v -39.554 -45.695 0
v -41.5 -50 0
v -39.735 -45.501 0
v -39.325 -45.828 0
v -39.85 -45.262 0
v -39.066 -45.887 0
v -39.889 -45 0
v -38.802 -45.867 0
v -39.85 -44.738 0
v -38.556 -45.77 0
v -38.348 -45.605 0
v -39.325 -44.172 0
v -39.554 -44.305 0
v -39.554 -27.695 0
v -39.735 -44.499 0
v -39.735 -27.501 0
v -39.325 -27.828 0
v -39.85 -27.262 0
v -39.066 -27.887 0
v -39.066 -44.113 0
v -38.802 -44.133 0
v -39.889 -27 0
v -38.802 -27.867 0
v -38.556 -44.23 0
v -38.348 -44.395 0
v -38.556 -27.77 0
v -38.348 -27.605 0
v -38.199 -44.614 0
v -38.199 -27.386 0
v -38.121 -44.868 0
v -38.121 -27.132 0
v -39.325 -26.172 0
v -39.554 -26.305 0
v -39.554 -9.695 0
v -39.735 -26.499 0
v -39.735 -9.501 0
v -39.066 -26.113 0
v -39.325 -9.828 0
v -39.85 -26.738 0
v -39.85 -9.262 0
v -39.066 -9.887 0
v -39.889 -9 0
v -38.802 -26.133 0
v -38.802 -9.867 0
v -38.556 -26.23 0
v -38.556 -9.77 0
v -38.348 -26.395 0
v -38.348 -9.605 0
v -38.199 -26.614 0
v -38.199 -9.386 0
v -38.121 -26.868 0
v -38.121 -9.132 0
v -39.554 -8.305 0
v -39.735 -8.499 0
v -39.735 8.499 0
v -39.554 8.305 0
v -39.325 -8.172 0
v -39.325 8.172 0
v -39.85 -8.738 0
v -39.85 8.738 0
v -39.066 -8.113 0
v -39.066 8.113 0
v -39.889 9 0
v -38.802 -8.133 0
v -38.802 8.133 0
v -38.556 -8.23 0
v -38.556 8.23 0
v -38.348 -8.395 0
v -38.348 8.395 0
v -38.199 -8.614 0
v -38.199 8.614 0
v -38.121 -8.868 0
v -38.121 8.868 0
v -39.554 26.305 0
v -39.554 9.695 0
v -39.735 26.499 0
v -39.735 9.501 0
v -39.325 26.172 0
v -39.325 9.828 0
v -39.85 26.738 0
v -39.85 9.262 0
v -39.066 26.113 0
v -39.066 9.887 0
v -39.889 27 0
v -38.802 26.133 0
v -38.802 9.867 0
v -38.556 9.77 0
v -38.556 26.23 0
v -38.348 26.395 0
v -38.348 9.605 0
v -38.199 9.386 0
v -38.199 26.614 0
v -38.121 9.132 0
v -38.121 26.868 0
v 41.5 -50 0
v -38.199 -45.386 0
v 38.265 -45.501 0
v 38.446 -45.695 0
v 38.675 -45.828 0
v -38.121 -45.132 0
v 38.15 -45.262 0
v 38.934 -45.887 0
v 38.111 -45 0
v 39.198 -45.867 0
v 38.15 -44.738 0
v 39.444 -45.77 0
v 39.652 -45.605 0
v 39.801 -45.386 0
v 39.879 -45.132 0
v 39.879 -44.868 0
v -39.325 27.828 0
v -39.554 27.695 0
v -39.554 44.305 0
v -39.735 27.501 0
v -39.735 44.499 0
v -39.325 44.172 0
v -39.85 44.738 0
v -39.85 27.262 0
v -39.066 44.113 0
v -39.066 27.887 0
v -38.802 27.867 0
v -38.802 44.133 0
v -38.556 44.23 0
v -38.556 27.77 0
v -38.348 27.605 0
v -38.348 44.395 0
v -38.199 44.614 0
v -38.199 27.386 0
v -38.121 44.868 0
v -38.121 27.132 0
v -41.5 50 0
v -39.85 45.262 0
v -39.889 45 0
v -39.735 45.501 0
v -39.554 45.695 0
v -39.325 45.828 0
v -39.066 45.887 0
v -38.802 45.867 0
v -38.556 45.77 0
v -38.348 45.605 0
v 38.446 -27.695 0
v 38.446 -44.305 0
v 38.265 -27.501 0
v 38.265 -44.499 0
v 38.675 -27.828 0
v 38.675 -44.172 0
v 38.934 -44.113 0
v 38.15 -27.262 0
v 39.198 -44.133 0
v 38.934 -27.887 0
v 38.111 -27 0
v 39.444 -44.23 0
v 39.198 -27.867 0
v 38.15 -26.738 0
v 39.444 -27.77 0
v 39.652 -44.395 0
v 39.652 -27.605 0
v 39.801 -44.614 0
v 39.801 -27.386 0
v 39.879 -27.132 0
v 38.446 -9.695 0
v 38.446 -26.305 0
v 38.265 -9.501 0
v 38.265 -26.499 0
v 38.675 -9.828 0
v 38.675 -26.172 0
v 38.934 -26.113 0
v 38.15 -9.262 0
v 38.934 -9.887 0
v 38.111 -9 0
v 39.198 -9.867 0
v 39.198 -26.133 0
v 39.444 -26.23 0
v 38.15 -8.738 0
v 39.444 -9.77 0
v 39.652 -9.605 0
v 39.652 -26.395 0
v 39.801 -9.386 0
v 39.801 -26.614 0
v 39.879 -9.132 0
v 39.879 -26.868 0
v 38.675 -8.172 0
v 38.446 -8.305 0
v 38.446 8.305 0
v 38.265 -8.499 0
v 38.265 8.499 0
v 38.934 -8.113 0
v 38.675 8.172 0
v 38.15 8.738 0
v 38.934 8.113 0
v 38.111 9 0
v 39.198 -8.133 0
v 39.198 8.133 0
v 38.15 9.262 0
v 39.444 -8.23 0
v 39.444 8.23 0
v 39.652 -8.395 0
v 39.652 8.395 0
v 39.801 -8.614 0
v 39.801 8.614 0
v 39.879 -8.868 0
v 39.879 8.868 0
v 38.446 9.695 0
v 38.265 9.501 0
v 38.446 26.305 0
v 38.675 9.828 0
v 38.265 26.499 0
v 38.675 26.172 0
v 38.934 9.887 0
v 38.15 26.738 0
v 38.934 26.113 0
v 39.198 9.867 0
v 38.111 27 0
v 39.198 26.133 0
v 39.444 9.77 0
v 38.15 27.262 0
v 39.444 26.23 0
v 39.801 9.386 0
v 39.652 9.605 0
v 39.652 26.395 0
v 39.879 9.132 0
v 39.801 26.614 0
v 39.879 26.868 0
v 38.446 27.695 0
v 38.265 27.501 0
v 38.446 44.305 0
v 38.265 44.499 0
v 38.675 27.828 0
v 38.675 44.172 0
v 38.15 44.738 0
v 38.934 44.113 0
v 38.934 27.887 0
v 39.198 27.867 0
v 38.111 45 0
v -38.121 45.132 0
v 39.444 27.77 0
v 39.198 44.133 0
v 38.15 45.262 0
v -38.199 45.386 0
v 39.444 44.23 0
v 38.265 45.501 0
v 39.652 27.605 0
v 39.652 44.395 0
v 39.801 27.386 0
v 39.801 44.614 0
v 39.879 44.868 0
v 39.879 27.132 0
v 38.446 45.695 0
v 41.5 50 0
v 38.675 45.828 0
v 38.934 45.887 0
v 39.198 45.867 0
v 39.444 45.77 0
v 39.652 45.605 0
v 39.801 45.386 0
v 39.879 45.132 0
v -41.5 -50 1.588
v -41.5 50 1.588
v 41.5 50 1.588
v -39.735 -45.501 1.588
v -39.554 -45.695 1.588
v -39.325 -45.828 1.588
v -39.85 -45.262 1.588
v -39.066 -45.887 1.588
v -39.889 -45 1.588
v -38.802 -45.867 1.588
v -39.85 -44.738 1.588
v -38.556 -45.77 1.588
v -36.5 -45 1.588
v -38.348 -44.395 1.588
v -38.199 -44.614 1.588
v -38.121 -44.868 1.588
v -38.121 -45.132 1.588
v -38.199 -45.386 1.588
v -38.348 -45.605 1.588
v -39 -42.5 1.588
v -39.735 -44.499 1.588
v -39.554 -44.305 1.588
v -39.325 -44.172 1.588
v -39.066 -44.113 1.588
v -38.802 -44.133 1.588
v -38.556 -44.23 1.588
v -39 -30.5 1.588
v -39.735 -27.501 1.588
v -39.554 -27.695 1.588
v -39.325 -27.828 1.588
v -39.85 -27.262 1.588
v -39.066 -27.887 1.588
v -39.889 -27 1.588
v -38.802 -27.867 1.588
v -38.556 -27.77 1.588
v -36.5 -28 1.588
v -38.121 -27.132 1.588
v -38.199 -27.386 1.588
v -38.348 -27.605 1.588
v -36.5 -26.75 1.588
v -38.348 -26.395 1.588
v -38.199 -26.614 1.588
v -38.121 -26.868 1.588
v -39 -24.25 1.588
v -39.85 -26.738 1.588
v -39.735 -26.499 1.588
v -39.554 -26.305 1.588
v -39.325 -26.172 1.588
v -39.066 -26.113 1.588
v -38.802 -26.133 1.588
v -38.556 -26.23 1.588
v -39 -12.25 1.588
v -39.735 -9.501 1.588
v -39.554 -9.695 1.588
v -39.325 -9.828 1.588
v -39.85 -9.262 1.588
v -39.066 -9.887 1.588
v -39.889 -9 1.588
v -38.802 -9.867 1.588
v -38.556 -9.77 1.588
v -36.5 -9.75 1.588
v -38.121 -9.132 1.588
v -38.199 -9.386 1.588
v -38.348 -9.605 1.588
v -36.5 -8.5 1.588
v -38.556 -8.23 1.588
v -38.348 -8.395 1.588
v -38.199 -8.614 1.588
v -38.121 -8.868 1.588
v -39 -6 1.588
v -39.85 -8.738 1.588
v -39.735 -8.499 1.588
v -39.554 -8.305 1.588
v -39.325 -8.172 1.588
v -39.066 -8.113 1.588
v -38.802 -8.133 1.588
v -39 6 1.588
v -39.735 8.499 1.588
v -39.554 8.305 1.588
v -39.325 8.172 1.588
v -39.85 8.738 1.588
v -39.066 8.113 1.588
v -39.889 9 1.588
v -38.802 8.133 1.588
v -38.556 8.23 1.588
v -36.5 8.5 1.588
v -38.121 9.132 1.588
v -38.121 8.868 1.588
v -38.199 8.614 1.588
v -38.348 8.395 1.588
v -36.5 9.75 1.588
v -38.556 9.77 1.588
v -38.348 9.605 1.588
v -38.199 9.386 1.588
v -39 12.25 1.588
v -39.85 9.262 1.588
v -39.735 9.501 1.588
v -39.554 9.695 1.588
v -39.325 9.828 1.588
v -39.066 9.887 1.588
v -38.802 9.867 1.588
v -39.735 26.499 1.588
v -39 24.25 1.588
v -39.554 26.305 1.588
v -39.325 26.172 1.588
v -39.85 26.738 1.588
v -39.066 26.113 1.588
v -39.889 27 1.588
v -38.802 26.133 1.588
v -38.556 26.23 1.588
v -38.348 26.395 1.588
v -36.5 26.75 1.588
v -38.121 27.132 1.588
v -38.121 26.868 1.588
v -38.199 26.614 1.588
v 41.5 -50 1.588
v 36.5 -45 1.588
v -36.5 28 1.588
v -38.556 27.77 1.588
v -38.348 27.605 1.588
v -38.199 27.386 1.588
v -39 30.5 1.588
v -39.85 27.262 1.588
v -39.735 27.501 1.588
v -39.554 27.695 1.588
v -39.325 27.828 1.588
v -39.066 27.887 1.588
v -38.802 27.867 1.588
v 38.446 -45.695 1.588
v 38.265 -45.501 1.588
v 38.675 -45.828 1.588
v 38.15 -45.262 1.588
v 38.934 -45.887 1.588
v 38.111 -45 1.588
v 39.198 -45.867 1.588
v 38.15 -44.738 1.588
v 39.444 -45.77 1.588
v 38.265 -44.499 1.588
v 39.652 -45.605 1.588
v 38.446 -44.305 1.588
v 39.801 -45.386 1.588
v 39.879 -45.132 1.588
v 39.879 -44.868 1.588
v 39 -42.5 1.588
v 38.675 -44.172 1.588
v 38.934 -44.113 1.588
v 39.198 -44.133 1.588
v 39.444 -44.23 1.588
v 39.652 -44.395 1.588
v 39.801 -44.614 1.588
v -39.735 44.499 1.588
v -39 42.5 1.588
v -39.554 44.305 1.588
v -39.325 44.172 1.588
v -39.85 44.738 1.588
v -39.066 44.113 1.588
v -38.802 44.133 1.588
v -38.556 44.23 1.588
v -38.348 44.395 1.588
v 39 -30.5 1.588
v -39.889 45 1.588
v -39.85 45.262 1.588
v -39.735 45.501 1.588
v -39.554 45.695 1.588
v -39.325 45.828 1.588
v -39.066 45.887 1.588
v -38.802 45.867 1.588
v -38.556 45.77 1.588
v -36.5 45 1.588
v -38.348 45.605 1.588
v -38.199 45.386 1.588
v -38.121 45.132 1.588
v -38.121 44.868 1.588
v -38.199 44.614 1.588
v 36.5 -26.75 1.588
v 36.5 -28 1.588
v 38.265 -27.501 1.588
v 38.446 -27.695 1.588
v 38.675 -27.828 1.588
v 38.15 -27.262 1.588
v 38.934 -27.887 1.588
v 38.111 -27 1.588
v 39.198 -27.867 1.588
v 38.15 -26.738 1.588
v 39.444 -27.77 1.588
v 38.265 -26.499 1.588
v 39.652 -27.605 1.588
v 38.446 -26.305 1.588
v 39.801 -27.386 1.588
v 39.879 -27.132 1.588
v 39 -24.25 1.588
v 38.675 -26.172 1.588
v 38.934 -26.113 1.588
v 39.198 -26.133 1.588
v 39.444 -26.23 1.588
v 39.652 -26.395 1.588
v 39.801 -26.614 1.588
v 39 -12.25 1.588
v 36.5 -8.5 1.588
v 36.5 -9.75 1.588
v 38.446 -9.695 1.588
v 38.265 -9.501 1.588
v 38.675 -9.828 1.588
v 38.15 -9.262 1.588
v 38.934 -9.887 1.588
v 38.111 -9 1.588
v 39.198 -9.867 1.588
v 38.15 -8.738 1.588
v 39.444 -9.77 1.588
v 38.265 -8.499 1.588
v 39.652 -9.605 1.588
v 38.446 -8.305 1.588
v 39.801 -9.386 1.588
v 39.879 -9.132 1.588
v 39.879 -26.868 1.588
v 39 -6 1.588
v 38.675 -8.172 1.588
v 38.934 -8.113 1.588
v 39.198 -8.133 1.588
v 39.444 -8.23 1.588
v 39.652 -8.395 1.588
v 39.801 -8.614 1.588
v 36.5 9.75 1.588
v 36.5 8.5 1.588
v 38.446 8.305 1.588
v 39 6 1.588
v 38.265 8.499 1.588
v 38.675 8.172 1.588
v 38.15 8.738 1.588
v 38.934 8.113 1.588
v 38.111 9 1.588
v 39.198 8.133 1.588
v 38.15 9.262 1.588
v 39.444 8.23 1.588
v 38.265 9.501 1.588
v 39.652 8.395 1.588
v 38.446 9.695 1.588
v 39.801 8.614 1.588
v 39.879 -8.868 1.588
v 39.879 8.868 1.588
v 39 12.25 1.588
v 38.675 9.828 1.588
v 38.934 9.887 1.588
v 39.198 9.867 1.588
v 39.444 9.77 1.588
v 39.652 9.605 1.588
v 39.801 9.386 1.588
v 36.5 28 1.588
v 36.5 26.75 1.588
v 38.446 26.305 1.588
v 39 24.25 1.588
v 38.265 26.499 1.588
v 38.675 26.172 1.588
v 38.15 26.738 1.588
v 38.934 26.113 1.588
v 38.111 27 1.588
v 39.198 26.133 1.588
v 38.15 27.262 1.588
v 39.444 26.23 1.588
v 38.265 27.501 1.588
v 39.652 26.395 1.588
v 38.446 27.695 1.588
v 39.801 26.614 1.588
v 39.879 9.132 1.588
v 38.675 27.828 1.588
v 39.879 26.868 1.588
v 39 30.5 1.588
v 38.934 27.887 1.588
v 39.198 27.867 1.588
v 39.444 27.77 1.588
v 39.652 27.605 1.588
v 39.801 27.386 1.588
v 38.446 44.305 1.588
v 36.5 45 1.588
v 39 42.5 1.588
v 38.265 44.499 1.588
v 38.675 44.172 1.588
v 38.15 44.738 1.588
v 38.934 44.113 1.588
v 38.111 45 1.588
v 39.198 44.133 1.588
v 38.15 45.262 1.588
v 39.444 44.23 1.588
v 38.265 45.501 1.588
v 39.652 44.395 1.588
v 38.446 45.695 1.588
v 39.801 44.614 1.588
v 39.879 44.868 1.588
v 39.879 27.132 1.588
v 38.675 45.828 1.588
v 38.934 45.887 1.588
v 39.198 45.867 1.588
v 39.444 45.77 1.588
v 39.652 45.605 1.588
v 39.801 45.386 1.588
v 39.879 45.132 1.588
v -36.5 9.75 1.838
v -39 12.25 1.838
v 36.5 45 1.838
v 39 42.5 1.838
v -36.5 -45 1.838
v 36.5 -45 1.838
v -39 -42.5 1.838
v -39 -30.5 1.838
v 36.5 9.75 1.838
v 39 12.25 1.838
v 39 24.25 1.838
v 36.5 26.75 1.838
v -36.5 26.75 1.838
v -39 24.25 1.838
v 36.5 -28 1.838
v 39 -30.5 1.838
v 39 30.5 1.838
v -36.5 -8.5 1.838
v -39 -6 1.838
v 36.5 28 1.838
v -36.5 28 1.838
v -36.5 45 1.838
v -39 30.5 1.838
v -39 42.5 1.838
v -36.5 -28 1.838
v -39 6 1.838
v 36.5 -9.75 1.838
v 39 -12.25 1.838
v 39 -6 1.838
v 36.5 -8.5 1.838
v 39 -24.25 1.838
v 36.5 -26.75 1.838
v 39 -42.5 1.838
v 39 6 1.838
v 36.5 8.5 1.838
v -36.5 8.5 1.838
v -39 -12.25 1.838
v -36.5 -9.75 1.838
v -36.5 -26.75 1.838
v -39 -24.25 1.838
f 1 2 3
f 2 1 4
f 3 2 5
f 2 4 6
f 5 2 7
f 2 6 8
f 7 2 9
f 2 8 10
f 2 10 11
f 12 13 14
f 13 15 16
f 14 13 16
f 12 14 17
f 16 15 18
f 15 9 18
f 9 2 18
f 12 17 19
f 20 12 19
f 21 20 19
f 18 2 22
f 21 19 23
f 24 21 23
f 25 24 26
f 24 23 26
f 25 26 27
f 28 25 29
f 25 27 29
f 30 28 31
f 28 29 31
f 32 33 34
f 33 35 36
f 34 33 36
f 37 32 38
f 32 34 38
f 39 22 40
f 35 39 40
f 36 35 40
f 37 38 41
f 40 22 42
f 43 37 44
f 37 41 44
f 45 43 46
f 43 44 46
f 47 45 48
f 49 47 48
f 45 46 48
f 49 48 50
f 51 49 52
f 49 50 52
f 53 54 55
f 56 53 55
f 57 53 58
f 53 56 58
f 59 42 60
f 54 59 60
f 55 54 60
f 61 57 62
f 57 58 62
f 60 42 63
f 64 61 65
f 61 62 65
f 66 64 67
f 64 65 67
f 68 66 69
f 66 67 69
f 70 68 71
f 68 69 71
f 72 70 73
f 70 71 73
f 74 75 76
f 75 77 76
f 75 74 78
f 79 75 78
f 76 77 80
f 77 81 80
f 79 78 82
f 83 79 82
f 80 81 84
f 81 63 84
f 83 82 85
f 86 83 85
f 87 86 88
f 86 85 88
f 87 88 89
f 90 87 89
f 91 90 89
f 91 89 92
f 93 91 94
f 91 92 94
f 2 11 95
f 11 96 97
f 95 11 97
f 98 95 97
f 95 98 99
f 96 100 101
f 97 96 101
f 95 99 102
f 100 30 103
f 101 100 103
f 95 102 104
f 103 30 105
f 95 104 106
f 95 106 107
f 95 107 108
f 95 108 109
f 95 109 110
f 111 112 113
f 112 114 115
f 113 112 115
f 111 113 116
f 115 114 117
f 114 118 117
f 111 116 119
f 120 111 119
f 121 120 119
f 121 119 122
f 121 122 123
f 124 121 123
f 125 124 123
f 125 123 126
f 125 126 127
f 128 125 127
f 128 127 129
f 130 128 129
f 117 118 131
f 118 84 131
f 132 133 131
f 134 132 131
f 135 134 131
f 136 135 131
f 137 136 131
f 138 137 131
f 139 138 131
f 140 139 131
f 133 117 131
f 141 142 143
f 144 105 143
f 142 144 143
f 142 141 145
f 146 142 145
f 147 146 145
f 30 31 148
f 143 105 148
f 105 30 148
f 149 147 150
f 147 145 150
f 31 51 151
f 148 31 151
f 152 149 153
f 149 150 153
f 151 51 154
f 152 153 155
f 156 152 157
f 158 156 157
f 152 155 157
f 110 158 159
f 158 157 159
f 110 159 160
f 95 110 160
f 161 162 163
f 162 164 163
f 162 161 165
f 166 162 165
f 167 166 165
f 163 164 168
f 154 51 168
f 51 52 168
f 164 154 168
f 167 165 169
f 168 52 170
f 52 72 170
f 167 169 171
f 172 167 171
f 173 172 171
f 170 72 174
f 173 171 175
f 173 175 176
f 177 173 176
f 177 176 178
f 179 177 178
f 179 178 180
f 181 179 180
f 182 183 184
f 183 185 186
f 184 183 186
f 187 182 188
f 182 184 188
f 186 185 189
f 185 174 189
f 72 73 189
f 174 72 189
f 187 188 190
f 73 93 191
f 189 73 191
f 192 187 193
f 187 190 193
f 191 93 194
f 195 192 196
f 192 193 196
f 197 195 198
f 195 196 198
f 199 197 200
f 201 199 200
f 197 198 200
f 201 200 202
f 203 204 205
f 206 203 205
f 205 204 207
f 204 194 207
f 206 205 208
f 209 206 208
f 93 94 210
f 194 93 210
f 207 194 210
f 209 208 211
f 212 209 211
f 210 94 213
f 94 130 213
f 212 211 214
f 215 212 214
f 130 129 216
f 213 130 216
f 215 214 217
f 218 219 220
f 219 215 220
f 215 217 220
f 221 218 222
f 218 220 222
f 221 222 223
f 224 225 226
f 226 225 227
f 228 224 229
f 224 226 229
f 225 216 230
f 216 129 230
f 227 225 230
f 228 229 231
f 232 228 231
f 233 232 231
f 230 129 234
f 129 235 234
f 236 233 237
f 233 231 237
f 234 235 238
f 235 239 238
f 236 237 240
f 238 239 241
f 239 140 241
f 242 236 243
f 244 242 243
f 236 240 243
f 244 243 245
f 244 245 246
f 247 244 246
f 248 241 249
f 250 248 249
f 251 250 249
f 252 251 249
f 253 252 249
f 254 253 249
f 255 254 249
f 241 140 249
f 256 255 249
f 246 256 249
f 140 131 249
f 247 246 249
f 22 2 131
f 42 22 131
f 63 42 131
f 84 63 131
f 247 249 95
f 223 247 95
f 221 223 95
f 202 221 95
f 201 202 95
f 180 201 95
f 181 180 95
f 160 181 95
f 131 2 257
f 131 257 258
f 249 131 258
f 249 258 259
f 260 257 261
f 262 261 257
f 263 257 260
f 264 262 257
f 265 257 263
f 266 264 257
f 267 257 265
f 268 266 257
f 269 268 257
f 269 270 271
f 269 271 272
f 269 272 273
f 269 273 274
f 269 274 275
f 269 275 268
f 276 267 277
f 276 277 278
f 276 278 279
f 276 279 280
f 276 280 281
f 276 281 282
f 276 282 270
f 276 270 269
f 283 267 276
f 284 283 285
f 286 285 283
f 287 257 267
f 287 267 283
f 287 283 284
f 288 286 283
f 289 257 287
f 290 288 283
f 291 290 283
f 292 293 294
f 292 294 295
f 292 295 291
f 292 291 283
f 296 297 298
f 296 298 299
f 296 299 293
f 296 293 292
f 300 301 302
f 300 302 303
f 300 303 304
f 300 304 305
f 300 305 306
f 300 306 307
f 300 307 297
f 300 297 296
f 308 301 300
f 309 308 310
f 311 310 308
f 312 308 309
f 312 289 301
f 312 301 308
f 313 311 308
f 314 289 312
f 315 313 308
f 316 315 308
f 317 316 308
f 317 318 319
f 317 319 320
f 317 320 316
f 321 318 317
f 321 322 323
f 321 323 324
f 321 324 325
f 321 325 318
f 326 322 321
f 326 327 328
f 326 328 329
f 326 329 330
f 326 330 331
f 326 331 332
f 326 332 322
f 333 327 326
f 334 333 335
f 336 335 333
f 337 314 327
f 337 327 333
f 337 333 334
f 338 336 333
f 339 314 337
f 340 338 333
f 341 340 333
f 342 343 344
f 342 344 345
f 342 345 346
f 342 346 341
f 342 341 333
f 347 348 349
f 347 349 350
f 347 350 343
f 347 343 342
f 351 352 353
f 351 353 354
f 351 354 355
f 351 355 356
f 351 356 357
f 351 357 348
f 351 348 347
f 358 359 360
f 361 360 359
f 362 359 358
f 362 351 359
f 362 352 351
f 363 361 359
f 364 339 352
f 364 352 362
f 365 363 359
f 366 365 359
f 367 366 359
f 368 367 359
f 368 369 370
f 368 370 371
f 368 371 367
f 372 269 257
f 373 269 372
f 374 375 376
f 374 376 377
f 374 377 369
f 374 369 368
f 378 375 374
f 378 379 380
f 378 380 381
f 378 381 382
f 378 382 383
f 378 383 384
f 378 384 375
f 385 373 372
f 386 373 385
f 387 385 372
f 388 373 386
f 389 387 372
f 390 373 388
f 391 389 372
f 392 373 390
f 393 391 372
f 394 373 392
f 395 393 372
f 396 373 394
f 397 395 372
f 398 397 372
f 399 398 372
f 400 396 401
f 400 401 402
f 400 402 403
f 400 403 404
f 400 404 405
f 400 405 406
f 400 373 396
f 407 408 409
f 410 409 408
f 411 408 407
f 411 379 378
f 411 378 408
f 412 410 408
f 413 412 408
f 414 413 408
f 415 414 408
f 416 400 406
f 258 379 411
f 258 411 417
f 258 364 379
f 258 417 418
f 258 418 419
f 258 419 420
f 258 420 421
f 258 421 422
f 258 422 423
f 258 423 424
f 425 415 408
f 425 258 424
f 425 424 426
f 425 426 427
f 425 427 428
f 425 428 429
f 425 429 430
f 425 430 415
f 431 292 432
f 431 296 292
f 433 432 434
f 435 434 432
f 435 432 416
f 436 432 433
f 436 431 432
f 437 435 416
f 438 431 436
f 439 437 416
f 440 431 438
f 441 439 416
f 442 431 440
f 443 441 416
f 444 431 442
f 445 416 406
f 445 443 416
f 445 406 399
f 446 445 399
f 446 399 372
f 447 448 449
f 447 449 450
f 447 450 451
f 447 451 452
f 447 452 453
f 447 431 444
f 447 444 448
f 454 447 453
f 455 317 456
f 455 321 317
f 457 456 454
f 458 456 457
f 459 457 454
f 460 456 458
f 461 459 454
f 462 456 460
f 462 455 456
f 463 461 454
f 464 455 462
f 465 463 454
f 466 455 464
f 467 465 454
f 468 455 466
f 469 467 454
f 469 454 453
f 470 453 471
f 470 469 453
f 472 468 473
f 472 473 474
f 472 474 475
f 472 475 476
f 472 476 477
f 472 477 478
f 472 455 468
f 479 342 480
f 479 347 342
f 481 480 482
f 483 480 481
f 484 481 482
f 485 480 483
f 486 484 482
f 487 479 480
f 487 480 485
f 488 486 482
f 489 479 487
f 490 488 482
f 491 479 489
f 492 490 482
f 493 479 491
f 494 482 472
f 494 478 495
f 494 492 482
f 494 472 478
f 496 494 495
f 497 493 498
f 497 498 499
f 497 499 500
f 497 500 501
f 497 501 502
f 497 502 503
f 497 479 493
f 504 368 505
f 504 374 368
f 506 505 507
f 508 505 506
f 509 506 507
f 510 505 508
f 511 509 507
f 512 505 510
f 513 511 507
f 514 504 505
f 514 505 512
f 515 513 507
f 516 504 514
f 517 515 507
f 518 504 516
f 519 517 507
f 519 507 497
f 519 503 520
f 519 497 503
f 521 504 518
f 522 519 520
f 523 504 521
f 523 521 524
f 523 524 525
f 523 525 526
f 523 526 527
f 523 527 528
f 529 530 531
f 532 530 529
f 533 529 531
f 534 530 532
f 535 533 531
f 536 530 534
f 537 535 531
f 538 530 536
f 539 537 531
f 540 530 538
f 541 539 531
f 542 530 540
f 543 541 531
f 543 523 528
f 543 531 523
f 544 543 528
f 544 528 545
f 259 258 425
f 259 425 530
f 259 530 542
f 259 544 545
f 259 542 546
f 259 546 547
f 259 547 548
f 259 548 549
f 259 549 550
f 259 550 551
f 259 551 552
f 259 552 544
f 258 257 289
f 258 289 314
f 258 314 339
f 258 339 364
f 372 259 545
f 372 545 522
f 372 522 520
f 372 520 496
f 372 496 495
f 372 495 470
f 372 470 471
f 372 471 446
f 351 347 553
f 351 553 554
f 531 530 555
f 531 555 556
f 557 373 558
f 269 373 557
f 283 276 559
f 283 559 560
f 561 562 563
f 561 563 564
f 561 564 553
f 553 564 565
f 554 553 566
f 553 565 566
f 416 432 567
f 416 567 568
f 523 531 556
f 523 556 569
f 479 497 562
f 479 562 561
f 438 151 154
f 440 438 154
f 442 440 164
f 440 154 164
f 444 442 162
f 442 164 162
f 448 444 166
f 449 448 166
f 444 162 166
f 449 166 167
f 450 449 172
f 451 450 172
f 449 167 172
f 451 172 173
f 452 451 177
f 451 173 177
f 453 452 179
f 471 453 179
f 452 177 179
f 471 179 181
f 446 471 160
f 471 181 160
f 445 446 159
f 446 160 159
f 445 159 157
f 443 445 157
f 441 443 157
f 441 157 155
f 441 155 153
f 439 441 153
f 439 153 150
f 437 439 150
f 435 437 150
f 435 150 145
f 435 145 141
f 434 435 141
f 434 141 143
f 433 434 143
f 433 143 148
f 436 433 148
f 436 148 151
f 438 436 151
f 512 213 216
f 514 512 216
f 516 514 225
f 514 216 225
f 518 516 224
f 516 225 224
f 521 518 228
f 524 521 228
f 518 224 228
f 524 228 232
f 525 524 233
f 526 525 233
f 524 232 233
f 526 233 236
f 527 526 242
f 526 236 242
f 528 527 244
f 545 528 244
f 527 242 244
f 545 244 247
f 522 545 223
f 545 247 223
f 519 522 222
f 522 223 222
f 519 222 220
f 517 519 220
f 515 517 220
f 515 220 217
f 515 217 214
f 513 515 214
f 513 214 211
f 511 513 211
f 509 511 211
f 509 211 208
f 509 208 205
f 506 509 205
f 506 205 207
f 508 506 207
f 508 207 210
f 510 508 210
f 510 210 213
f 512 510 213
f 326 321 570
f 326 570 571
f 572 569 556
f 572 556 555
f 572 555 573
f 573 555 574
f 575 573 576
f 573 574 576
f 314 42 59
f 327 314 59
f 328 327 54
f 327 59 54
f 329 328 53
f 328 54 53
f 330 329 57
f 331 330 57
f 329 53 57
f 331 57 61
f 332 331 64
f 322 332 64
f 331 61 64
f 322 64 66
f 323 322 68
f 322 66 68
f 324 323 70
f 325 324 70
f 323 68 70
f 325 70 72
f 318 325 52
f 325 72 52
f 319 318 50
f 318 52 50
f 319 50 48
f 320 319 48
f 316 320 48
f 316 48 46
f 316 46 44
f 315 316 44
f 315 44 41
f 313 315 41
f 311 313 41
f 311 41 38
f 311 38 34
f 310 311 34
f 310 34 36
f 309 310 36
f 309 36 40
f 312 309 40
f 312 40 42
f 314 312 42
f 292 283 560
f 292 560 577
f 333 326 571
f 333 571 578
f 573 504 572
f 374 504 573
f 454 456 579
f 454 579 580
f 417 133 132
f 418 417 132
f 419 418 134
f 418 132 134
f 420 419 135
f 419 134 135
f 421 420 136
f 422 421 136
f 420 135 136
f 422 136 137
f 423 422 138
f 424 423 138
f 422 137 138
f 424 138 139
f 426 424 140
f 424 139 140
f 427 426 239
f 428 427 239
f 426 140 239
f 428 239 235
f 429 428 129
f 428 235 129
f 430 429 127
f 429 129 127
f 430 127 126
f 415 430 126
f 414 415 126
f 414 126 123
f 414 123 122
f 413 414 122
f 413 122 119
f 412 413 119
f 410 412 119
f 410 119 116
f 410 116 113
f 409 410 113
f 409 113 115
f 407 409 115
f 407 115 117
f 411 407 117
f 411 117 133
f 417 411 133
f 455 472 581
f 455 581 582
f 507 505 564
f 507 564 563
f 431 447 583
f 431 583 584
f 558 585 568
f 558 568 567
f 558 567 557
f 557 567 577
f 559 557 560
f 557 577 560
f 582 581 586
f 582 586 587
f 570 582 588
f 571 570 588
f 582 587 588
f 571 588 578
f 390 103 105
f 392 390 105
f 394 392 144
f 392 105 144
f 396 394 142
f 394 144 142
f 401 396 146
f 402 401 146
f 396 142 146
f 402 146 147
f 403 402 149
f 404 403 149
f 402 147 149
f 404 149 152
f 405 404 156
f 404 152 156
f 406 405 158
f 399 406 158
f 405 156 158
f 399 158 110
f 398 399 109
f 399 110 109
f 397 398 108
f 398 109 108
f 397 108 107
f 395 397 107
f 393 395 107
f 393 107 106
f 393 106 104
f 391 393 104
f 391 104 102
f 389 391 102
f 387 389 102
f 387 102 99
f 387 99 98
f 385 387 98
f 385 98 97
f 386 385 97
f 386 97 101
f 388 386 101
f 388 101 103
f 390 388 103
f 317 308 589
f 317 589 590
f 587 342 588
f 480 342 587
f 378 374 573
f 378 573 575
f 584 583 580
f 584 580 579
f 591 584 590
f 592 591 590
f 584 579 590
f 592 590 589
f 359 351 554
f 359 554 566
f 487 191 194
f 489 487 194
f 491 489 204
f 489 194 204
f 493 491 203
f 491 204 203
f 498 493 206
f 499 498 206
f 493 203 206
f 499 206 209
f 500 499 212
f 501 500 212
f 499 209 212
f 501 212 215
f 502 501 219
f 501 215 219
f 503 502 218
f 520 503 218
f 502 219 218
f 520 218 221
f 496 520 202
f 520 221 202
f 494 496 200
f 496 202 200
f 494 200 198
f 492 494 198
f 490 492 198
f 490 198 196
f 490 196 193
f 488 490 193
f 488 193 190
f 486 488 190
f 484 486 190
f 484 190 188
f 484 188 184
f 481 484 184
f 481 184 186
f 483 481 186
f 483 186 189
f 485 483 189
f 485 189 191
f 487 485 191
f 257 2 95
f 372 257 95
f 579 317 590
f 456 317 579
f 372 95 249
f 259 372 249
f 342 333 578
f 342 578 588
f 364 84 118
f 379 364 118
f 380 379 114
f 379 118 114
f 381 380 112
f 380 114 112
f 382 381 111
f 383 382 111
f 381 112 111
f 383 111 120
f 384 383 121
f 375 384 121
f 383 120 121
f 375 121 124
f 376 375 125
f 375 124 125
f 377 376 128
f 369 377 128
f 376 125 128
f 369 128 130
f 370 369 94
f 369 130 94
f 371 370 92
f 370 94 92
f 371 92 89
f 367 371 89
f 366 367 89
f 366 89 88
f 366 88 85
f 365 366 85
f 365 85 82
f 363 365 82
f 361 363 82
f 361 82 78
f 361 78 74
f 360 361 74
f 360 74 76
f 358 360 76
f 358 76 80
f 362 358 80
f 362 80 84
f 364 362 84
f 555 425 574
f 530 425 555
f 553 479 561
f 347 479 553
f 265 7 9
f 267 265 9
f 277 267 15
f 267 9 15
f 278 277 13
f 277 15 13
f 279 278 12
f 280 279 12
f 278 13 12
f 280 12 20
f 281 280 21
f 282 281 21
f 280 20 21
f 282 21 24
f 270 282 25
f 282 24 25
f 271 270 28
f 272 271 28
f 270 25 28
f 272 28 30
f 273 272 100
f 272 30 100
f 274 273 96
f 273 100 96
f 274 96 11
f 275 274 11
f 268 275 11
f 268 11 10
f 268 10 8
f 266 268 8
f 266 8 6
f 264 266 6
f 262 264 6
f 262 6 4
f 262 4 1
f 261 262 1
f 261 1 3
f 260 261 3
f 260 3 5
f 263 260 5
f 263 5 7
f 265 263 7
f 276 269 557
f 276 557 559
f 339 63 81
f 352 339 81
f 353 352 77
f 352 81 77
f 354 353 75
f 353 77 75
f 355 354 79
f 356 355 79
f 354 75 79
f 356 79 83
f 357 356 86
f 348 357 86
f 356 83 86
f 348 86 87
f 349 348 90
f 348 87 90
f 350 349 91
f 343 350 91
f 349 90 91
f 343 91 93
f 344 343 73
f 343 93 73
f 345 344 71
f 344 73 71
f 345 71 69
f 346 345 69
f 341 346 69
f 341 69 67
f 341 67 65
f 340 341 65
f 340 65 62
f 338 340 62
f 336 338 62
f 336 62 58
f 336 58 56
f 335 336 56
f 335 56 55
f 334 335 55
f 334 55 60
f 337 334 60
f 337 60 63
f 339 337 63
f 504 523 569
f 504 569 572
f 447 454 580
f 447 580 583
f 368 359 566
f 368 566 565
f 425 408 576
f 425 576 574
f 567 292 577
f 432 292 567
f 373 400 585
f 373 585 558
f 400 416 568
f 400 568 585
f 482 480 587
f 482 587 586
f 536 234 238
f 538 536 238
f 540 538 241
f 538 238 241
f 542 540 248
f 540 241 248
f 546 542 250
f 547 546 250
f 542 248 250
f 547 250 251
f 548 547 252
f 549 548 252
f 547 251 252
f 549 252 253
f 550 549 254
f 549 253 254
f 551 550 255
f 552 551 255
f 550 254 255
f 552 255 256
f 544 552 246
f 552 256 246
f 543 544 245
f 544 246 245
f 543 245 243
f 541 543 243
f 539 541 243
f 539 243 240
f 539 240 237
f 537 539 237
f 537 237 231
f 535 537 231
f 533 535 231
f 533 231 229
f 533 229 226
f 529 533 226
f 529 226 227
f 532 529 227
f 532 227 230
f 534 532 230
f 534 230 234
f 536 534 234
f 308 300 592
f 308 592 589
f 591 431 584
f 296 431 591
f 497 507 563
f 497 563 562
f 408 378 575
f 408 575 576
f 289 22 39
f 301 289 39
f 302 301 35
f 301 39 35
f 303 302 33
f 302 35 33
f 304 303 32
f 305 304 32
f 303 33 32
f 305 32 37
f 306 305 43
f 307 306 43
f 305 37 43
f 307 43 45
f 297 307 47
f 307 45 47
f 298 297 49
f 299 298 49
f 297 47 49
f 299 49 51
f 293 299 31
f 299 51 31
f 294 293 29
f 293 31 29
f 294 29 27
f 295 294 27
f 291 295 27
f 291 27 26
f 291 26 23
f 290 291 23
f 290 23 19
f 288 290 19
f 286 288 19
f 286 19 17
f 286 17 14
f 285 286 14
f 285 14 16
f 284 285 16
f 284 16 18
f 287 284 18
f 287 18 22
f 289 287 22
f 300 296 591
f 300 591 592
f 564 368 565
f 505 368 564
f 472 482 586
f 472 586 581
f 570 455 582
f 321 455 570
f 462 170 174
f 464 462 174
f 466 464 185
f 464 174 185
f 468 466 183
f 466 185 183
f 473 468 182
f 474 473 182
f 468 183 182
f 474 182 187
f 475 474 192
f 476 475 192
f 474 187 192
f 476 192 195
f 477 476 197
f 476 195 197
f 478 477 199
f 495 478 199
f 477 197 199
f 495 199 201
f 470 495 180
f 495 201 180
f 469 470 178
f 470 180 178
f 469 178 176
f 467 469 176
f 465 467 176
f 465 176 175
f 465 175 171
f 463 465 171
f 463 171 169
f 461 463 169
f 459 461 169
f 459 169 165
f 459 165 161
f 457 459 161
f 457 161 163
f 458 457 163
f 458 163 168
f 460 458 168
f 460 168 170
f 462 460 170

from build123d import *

# Parameters (mm, degrees)
SKETCH1_W                 = 83
SKETCH1_H                 = 100
BOSS_EXTRUDE1_DEPTH       = 1.5875
BOSS_EXTRUDE2_DEPTH       = 0.25
F_0_CLEARANCE_HOLE1_D     = 1.778
F_0_CLEARANCE_HOLE1_DEPTH = 3.175
F_0_CLEARANCE_HOLE1_TIP   = 0.53416509


with BuildPart() as part:
    # Sketch1 → Boss-Extrude1 (new body)
    with BuildSketch(Plane.XY):
        Rectangle(SKETCH1_W, SKETCH1_H)
    extrude(amount=BOSS_EXTRUDE1_DEPTH)

    # Sketch2 → Boss-Extrude2 (add)
    with BuildSketch(Plane.XY.offset(1.5875)):
        Polygon((-36.5, 45), (36.5, 45), (39, 42.5), (39, 30.5), (36.5, 28), (-36.5, 28), (-39, 30.5), (-39, 42.5), align=None)
        Polygon((-36.5, 26.75), (36.5, 26.75), (39, 24.25), (39, 12.25), (36.5, 9.75), (-36.5, 9.75), (-39, 12.25), (-39, 24.25), align=None)
        Polygon((-36.5, 8.5), (36.5, 8.5), (39, 6), (39, -6), (36.5, -8.5), (-36.5, -8.5), (-39, -6), (-39, 6), align=None)
        Polygon((-36.5, -9.75), (36.5, -9.75), (39, -12.25), (39, -24.25), (36.5, -26.75), (-36.5, -26.75), (-39, -24.25), (-39, -12.25), align=None)
        Polygon((-36.5, -28), (36.5, -28), (39, -30.5), (39, -42.5), (36.5, -45), (-36.5, -45), (-39, -42.5), (-39, -30.5), align=None)
    extrude(amount=BOSS_EXTRUDE2_DEPTH)

    # #0 Clearance Hole1
    with Locations(Plane.XY.offset(1.5875)):
        with Locations((-39, 45), (-39, 27), (-39, 9), (-39, -9), (-39, -27), (-39, -45), (39, -45), (39, -27), (39, -9), (39, 9), (39, 27), (39, 45)):
            Hole(F_0_CLEARANCE_HOLE1_D / 2, depth=F_0_CLEARANCE_HOLE1_DEPTH)
            with Locations((0, 0, -(F_0_CLEARANCE_HOLE1_DEPTH + F_0_CLEARANCE_HOLE1_TIP / 2))):  # 118° drill point
                Cone(0, F_0_CLEARANCE_HOLE1_D / 2, F_0_CLEARANCE_HOLE1_TIP, mode=Mode.SUBTRACT)


solid = part.part
